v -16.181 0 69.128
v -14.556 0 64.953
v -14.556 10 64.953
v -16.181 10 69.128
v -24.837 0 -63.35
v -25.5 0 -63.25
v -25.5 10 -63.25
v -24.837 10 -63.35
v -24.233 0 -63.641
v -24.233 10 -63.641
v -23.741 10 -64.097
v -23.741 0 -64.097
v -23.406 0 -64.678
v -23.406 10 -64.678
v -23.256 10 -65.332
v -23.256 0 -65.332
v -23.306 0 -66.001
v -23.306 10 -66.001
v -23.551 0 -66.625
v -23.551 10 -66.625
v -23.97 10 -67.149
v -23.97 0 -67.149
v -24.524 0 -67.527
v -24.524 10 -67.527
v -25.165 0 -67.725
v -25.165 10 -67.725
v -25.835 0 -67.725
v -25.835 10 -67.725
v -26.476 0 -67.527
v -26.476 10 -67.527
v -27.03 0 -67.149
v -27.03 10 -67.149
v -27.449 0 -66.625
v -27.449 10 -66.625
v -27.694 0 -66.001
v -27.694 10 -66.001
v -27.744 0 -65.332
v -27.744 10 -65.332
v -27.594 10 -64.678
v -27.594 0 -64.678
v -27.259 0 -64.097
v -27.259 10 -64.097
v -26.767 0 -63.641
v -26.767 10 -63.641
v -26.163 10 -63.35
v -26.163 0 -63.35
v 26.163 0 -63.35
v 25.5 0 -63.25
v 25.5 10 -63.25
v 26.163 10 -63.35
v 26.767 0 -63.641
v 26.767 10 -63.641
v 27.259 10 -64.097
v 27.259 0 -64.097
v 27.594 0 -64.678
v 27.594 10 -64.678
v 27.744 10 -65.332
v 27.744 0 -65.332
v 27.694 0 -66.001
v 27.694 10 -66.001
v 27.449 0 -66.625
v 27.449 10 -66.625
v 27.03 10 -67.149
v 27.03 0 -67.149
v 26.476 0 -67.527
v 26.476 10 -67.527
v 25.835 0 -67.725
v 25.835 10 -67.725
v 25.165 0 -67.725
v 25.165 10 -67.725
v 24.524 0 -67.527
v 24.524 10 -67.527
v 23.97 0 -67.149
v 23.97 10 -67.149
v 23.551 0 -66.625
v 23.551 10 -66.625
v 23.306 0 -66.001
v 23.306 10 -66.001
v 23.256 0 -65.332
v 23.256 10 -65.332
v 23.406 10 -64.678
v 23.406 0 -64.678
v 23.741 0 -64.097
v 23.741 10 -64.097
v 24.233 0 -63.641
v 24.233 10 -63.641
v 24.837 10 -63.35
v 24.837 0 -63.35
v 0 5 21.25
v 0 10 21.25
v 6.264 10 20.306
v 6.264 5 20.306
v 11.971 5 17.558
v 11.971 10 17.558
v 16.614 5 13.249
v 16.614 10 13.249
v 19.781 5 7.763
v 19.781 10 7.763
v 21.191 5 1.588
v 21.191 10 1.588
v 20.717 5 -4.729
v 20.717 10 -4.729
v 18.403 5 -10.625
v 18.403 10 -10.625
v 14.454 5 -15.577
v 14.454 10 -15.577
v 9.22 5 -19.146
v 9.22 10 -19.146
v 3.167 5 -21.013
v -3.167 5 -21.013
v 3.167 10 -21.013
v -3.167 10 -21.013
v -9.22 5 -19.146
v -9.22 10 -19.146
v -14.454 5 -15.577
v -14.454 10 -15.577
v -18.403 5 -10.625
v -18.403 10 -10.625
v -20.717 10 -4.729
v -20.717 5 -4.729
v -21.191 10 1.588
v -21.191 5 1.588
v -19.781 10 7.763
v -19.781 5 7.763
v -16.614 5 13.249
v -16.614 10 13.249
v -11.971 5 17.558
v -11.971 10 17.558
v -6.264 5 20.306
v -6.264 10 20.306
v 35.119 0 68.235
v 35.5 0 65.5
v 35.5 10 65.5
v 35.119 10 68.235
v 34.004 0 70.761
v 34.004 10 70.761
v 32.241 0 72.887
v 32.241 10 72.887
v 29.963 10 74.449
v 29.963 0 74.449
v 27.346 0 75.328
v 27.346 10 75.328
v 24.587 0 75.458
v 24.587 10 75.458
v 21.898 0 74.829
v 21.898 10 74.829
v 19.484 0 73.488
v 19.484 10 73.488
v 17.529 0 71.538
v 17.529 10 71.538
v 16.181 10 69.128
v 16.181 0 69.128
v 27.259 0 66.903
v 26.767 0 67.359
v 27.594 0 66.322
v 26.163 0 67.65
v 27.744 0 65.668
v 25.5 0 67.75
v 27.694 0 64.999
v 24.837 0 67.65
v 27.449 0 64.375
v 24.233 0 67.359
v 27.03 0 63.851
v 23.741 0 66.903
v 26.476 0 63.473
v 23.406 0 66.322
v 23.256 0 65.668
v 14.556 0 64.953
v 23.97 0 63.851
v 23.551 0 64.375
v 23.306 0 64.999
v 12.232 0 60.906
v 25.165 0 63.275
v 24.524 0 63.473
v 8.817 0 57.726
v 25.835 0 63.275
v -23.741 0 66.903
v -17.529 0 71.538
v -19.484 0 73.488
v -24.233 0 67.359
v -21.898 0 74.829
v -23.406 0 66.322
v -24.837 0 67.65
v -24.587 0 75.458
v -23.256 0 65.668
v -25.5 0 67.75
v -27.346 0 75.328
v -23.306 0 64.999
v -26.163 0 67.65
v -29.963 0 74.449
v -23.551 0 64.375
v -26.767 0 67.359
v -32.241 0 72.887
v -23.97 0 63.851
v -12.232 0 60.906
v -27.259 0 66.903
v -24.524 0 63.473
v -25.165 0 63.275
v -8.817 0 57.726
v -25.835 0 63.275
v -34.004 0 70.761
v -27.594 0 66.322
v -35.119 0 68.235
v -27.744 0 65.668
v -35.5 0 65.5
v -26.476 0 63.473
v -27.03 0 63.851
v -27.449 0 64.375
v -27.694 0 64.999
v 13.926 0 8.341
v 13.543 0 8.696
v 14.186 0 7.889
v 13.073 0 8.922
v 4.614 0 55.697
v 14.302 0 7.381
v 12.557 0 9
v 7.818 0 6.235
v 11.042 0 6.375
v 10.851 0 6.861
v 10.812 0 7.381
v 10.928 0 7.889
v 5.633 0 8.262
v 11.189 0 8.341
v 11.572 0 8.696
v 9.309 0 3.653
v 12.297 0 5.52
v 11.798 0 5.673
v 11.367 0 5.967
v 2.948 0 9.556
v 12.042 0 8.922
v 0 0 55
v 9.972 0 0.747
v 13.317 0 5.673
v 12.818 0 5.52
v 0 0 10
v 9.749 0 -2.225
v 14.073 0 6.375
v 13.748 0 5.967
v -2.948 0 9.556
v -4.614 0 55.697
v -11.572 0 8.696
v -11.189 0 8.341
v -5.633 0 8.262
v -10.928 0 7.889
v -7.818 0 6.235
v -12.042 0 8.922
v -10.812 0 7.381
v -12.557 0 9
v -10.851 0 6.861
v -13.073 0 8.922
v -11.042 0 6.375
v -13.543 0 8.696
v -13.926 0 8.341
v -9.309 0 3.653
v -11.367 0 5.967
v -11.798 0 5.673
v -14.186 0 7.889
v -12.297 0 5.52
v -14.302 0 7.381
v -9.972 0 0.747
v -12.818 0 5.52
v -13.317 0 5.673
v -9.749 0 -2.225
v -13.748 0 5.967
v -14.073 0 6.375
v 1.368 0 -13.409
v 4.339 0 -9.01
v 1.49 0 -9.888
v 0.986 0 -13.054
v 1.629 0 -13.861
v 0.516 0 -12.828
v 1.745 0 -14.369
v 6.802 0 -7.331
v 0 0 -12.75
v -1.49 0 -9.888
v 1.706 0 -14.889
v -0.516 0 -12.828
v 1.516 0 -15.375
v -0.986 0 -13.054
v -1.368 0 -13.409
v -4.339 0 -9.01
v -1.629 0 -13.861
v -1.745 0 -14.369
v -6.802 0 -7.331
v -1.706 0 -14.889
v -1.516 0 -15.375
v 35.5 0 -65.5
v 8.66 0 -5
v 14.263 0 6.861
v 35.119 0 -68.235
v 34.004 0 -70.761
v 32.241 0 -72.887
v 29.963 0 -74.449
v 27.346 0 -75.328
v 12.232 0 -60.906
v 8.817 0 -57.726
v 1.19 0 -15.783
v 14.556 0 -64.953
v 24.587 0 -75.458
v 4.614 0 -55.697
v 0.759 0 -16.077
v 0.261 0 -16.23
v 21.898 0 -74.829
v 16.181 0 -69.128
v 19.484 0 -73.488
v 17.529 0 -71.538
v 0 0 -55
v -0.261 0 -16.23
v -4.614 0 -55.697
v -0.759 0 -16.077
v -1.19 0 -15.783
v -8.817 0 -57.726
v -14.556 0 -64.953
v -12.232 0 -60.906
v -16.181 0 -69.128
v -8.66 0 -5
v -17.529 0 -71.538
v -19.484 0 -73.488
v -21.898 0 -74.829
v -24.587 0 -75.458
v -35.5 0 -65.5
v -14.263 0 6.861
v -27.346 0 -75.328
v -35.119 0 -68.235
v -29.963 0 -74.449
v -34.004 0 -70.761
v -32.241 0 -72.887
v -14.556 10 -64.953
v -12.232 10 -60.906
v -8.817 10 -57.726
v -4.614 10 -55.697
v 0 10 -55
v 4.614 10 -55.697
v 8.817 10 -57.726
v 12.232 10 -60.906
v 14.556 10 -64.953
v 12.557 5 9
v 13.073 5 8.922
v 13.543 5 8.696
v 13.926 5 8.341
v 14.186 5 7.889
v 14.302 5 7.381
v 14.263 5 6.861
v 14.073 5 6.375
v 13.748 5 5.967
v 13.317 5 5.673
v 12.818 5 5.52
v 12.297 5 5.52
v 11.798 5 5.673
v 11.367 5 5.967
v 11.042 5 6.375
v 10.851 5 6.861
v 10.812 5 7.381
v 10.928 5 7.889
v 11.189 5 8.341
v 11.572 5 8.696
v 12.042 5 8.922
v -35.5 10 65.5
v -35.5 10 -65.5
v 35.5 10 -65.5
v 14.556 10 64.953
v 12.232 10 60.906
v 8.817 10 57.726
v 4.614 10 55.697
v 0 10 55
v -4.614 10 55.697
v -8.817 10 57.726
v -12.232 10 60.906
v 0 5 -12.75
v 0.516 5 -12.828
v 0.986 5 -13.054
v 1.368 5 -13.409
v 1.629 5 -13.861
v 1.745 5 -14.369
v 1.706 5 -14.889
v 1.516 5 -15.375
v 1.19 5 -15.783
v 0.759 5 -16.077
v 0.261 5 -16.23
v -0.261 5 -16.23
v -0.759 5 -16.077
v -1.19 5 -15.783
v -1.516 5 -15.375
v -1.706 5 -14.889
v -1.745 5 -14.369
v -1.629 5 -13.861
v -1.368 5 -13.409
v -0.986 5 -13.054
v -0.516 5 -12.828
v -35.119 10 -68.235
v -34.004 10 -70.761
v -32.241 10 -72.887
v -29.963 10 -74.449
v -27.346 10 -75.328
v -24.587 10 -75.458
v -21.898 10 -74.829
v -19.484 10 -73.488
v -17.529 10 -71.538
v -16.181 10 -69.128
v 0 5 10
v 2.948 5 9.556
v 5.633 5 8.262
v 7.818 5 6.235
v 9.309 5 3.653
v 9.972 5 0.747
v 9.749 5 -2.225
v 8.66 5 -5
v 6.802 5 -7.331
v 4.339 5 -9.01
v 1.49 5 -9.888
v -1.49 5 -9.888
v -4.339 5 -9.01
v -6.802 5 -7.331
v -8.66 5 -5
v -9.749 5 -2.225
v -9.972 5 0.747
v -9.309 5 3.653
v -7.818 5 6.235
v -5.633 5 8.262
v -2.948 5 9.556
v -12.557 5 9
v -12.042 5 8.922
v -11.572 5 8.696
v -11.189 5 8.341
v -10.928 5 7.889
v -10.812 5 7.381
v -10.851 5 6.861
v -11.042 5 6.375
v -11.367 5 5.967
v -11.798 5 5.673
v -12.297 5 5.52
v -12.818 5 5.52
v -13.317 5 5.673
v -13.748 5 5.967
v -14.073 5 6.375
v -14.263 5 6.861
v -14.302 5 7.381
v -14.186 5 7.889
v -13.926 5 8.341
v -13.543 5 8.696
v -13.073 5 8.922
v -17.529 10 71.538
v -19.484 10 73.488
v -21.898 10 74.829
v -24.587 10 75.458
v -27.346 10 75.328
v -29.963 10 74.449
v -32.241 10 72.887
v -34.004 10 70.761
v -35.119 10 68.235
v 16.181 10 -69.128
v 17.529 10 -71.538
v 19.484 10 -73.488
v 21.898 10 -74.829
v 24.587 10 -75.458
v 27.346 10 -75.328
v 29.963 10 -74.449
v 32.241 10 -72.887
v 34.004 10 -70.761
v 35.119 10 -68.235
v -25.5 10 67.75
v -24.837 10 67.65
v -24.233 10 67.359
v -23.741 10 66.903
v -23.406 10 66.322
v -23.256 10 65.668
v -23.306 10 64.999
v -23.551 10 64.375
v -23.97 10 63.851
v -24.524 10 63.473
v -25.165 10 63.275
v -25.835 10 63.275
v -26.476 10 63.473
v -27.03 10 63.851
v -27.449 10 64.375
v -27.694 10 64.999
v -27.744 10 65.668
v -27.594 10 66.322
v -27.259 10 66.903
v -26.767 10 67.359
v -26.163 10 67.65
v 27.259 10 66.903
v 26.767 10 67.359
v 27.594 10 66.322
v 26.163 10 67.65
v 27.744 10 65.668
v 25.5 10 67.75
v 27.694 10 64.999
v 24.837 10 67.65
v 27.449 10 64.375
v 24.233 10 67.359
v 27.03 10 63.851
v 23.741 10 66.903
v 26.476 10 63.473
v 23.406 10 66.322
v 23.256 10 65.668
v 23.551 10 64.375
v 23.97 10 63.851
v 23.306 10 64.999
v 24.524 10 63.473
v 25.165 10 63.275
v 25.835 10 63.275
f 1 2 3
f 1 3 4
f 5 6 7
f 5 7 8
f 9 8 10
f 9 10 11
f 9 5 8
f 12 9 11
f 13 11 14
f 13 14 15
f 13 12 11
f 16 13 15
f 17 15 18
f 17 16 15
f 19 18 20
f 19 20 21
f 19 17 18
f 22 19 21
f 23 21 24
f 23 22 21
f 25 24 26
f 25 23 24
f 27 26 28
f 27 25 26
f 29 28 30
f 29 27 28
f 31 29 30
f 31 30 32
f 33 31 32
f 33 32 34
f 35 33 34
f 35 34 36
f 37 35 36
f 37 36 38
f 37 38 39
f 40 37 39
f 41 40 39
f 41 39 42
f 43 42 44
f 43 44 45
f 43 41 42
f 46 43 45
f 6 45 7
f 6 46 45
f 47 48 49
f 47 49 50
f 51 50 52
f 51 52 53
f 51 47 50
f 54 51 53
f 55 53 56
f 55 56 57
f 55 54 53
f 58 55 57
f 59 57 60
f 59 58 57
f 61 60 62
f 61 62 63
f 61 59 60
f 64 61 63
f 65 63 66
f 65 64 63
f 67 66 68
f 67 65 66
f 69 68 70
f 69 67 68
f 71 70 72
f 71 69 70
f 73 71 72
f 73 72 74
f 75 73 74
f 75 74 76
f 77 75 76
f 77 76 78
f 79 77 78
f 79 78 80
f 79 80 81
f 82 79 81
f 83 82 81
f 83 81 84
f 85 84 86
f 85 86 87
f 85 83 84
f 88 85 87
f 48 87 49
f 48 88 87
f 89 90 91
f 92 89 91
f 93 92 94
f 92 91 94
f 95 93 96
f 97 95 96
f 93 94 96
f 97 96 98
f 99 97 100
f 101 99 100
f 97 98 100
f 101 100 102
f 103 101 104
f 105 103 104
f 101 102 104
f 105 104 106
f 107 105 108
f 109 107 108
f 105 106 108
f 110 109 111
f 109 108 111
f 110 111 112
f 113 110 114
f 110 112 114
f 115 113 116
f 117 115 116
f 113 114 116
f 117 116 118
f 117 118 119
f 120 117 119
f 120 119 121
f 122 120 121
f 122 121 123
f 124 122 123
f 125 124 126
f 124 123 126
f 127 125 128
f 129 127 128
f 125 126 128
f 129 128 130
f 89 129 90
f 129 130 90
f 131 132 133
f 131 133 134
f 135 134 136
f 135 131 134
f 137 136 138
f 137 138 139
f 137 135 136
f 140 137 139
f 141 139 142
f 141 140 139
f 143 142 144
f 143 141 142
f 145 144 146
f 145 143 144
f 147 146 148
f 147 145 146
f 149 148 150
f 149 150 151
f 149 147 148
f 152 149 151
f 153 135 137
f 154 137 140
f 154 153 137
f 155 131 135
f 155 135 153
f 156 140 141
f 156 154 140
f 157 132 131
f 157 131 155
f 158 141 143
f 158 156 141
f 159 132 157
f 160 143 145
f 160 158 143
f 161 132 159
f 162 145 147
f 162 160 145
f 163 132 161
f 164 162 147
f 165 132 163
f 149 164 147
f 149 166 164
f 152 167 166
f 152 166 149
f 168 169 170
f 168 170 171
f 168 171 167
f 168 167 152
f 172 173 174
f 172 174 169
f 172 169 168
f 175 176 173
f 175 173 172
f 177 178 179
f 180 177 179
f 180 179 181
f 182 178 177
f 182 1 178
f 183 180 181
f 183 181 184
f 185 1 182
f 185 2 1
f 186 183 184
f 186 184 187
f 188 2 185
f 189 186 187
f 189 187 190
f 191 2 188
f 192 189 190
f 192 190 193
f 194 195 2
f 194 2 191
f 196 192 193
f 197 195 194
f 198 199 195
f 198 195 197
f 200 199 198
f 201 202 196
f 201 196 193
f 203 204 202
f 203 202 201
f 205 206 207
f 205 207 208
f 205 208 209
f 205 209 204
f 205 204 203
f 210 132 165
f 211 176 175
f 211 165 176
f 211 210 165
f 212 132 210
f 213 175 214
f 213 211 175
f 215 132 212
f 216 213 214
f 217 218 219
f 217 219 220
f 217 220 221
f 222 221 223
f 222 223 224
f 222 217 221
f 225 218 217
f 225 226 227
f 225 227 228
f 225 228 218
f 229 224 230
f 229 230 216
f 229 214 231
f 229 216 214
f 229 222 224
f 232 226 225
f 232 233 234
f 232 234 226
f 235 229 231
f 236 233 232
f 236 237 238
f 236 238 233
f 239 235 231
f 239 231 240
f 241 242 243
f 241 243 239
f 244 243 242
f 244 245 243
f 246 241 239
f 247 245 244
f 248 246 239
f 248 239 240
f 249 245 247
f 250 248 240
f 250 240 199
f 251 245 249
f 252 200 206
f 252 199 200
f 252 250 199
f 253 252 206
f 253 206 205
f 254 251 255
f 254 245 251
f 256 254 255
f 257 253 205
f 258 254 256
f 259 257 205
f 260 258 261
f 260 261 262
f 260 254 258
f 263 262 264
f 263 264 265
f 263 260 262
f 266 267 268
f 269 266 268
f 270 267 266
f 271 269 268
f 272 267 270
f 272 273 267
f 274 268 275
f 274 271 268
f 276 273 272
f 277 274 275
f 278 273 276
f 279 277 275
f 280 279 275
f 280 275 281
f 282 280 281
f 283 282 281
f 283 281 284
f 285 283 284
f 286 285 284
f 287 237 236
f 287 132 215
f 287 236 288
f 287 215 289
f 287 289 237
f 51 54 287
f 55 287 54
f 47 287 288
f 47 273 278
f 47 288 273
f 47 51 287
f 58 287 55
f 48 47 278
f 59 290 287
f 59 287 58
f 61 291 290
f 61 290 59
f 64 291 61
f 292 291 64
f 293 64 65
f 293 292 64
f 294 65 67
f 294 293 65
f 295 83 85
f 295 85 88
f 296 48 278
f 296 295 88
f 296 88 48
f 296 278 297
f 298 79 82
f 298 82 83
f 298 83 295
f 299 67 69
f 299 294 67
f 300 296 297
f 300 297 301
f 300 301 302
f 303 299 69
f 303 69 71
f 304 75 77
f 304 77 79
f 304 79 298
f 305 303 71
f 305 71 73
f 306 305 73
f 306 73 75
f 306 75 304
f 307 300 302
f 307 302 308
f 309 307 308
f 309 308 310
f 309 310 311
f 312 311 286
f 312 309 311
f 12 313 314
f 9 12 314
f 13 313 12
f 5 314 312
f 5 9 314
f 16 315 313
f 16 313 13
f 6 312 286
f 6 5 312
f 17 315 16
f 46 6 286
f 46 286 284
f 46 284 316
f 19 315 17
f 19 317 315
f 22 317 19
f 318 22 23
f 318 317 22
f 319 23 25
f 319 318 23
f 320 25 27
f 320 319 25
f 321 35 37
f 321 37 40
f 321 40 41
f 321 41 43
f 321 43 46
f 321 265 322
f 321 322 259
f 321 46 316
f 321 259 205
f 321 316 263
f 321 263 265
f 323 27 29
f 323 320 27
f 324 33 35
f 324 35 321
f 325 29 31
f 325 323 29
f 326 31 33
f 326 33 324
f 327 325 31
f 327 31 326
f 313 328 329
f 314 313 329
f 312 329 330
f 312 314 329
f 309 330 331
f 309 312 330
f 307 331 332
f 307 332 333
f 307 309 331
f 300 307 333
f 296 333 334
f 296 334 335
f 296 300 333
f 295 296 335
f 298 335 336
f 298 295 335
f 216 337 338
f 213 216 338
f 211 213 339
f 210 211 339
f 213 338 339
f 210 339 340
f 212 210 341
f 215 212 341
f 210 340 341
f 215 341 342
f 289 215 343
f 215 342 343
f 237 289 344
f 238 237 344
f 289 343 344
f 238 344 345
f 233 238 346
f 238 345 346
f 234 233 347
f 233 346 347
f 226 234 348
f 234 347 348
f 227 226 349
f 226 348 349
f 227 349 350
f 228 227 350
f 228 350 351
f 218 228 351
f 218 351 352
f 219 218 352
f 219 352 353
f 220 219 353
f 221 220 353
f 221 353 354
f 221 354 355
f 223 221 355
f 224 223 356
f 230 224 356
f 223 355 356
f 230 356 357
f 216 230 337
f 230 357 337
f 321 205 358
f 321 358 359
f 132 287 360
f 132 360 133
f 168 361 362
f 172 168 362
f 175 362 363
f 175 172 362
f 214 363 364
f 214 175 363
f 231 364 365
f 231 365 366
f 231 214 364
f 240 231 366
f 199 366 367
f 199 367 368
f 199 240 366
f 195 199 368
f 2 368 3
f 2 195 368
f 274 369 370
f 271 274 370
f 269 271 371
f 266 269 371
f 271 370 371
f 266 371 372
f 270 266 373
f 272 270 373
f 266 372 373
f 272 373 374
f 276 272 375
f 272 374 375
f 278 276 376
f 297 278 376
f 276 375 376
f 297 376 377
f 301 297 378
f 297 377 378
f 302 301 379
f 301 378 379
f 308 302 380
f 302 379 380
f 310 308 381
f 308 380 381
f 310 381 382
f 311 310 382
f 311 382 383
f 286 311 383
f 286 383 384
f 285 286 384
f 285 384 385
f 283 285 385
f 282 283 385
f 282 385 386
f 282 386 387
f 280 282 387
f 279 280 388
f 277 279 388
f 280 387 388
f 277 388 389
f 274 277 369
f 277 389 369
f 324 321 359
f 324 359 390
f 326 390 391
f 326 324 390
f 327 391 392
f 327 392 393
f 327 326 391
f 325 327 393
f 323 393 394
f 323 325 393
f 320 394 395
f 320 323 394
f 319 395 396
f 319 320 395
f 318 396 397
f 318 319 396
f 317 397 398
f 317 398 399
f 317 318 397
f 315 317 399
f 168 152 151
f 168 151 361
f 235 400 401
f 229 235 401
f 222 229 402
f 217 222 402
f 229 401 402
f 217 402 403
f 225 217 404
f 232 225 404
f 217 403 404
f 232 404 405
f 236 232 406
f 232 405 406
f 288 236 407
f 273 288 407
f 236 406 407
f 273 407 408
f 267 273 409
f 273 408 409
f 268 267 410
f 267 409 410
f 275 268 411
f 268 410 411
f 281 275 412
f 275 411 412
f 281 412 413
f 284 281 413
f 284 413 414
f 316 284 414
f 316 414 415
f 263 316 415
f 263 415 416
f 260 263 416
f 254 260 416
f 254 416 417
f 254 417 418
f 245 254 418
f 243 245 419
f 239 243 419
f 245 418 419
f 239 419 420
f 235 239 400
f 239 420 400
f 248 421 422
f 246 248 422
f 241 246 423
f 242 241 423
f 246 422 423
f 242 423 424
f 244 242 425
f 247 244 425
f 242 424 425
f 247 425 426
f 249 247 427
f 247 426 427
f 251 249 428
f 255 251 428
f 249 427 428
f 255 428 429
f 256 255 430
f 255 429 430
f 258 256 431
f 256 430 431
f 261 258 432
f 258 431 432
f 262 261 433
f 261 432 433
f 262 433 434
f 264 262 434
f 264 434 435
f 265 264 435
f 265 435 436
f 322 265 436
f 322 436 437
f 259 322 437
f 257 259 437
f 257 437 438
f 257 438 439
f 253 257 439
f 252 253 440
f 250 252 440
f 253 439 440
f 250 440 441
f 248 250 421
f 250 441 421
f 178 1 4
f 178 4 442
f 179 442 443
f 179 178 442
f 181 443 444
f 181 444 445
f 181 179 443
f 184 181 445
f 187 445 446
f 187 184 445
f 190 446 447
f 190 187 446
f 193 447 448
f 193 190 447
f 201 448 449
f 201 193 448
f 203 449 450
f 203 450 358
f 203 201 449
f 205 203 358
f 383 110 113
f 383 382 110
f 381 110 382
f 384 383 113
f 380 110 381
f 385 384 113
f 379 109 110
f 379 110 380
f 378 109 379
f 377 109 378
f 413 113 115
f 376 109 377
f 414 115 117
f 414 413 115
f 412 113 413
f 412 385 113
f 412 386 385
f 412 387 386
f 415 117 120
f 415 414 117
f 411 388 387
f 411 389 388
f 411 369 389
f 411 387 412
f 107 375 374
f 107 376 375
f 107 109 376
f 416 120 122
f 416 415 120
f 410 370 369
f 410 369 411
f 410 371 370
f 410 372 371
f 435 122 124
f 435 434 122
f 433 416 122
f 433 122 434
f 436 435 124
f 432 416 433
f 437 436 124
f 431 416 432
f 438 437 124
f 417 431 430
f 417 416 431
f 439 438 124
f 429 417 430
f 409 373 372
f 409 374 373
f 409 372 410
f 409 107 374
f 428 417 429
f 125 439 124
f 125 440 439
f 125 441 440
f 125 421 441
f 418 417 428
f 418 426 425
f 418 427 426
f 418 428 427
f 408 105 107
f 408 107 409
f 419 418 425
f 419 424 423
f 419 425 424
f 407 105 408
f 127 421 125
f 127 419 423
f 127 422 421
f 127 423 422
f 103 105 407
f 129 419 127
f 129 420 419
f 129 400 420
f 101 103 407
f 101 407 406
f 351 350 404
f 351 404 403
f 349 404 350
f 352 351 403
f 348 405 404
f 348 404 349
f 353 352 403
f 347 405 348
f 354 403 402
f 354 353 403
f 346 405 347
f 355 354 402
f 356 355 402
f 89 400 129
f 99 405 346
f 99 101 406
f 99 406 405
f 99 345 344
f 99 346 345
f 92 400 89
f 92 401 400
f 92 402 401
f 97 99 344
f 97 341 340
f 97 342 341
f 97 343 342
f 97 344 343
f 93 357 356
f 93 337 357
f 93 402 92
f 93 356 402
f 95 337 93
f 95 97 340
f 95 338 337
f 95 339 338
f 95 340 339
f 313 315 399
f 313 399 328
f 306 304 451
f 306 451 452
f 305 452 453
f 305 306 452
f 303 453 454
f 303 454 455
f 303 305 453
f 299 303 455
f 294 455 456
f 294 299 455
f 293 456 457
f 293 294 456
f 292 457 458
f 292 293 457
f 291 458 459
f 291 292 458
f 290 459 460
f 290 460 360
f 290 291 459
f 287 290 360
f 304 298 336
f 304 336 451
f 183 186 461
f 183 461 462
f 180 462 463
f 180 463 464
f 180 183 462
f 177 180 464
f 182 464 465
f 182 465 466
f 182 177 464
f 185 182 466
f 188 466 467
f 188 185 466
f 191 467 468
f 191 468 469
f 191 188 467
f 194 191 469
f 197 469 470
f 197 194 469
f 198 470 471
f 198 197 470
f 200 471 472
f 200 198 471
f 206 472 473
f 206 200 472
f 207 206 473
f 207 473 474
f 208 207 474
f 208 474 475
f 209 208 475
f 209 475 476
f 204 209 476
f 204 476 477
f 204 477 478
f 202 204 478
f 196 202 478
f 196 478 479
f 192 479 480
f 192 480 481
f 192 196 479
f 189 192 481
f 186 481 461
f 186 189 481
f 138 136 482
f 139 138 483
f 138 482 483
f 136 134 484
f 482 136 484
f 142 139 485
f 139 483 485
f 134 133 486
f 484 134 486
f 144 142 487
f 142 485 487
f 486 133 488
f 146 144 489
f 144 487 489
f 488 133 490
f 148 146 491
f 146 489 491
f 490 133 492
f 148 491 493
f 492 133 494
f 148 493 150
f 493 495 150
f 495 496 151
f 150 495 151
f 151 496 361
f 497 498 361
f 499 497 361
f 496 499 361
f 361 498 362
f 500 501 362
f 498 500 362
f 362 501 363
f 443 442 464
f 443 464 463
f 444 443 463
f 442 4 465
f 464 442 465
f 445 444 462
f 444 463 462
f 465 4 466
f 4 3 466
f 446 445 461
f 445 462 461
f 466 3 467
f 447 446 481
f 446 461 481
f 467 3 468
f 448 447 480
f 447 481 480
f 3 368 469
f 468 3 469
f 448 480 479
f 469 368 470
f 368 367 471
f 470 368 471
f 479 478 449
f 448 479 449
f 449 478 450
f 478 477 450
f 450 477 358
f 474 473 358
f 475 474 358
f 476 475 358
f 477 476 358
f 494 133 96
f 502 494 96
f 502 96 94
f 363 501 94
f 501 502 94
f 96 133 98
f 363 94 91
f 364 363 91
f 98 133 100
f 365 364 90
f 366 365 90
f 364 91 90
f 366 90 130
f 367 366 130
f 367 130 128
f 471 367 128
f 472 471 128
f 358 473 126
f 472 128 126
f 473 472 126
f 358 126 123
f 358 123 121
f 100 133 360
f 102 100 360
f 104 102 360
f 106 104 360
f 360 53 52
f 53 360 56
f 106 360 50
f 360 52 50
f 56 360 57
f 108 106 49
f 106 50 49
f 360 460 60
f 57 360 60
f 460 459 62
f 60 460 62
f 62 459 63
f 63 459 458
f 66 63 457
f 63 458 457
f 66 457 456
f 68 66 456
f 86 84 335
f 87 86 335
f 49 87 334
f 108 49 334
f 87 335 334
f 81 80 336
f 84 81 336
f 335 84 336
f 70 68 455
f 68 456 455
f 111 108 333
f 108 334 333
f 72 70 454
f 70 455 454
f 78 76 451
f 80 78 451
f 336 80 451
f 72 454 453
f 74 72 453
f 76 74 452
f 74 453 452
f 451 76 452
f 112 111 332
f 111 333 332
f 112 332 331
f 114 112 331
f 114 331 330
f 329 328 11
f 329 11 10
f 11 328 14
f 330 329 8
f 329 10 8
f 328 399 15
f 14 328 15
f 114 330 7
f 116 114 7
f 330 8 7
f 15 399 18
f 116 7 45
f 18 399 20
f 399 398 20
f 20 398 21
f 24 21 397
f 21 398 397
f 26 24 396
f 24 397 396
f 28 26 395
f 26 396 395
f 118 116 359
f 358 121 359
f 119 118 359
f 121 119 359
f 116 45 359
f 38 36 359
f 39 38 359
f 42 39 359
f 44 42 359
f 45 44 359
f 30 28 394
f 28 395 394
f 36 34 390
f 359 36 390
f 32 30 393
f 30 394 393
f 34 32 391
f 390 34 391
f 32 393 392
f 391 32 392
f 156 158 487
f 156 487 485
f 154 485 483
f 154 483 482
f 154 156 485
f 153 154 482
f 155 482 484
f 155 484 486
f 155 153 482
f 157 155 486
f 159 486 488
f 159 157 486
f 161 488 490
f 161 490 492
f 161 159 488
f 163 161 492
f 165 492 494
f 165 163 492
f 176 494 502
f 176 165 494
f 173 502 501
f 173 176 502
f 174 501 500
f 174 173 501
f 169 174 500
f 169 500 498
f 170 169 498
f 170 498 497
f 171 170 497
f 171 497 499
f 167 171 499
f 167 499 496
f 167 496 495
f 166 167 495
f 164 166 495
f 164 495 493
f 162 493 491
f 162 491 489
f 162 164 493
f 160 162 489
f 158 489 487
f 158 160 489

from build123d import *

# Parameters (mm, degrees)
SKETCH1_R           = 2.25
EXTRUDE_1_DEPTH     = 10
SKETCH_1_R          = 21.25
CUT_EXTRUDE_1_DEPTH = 5
SKETCH_2_R          = 1.75
SKETCH_2_R_2        = 10
CUT_EXTRUDE_2_DEPTH = 5


with BuildPart() as part:
    # Sketch1 → 凸台-拉伸1 (new body)
    with BuildSketch(Plane(origin=(0, 0, 0), x_dir=(1, 0, 0), z_dir=(0, 1, 0))):
        with BuildLine():
            Line((-16.181288894, 69.127895164), (-14.556112863, 64.953423399))
            ThreePointArc((-14.556112863, 64.953423399), (0, 55), (14.556112863, 64.953423399))
            Line((14.556112863, 64.953423399), (16.181288894, 69.127895164))
            ThreePointArc((16.181288894, 69.127895164), (27.345655566, 75.32820205), (35.5, 65.5))
            Line((35.5, 65.5), (35.5, -65.5))
            ThreePointArc((35.5, -65.5), (27.345655566, -75.32820205), (16.181288894, -69.127895164))
            Line((16.181288894, -69.127895164), (14.556112863, -64.953423399))
            ThreePointArc((14.556112863, -64.953423399), (0, -55), (-14.556112863, -64.953423399))
            Line((-14.556112863, -64.953423399), (-16.181288894, -69.127895164))
            ThreePointArc((-16.181288894, -69.127895164), (-27.345655566, -75.32820205), (-35.5, -65.5))
            Line((-35.5, -65.5), (-35.5, 65.5))
            ThreePointArc((-35.5, 65.5), (-27.345655566, 75.32820205), (-16.181288894, 69.127895164))
        make_face()
        with Locations(Location((25.5, 65.5, 0), (0, 0, 270))):
            Circle(SKETCH1_R, mode=Mode.SUBTRACT)
        with Locations(Location((-25.5, 65.5, 0), (0, 0, 270))):
            Circle(SKETCH1_R, mode=Mode.SUBTRACT)
        with Locations(Location((-25.5, -65.5, 0), (0, 0, 270))):
            Circle(SKETCH1_R, mode=Mode.SUBTRACT)
        with Locations(Location((25.5, -65.5, 0), (0, 0, 270))):
            Circle(SKETCH1_R, mode=Mode.SUBTRACT)
    extrude(amount=EXTRUDE_1_DEPTH)

    # 草图1 → 切除-拉伸1 (cut)
    with BuildSketch(Plane(origin=(0, 10, 0), x_dir=(1, 0, 0), z_dir=(0, 1, 0))):
        with Locations(Location((0, 0, 0), (0, 0, 270))):
            Circle(SKETCH_1_R)
    extrude(amount=-CUT_EXTRUDE_1_DEPTH, mode=Mode.SUBTRACT)

    # 草图2 → 切除-拉伸2 (cut)
    with BuildSketch(Plane(origin=(0, 5, 0), x_dir=(1, 0, 0), z_dir=(0, 1, 0))):
        with Locations(Location((0, 14.5, 0), (0, 0, 270))):
            Circle(SKETCH_2_R)
        with Locations(Location((12.557368355, -7.25, 0), (0, 0, 270))):
            Circle(SKETCH_2_R)
        with Locations(Location((-12.557368355, -7.25, 0), (0, 0, 270))):
            Circle(SKETCH_2_R)
        with Locations(Location((0, 0, 0), (0, 0, 270))):
            Circle(SKETCH_2_R_2)
    extrude(amount=-CUT_EXTRUDE_2_DEPTH, mode=Mode.SUBTRACT)


solid = part.part
